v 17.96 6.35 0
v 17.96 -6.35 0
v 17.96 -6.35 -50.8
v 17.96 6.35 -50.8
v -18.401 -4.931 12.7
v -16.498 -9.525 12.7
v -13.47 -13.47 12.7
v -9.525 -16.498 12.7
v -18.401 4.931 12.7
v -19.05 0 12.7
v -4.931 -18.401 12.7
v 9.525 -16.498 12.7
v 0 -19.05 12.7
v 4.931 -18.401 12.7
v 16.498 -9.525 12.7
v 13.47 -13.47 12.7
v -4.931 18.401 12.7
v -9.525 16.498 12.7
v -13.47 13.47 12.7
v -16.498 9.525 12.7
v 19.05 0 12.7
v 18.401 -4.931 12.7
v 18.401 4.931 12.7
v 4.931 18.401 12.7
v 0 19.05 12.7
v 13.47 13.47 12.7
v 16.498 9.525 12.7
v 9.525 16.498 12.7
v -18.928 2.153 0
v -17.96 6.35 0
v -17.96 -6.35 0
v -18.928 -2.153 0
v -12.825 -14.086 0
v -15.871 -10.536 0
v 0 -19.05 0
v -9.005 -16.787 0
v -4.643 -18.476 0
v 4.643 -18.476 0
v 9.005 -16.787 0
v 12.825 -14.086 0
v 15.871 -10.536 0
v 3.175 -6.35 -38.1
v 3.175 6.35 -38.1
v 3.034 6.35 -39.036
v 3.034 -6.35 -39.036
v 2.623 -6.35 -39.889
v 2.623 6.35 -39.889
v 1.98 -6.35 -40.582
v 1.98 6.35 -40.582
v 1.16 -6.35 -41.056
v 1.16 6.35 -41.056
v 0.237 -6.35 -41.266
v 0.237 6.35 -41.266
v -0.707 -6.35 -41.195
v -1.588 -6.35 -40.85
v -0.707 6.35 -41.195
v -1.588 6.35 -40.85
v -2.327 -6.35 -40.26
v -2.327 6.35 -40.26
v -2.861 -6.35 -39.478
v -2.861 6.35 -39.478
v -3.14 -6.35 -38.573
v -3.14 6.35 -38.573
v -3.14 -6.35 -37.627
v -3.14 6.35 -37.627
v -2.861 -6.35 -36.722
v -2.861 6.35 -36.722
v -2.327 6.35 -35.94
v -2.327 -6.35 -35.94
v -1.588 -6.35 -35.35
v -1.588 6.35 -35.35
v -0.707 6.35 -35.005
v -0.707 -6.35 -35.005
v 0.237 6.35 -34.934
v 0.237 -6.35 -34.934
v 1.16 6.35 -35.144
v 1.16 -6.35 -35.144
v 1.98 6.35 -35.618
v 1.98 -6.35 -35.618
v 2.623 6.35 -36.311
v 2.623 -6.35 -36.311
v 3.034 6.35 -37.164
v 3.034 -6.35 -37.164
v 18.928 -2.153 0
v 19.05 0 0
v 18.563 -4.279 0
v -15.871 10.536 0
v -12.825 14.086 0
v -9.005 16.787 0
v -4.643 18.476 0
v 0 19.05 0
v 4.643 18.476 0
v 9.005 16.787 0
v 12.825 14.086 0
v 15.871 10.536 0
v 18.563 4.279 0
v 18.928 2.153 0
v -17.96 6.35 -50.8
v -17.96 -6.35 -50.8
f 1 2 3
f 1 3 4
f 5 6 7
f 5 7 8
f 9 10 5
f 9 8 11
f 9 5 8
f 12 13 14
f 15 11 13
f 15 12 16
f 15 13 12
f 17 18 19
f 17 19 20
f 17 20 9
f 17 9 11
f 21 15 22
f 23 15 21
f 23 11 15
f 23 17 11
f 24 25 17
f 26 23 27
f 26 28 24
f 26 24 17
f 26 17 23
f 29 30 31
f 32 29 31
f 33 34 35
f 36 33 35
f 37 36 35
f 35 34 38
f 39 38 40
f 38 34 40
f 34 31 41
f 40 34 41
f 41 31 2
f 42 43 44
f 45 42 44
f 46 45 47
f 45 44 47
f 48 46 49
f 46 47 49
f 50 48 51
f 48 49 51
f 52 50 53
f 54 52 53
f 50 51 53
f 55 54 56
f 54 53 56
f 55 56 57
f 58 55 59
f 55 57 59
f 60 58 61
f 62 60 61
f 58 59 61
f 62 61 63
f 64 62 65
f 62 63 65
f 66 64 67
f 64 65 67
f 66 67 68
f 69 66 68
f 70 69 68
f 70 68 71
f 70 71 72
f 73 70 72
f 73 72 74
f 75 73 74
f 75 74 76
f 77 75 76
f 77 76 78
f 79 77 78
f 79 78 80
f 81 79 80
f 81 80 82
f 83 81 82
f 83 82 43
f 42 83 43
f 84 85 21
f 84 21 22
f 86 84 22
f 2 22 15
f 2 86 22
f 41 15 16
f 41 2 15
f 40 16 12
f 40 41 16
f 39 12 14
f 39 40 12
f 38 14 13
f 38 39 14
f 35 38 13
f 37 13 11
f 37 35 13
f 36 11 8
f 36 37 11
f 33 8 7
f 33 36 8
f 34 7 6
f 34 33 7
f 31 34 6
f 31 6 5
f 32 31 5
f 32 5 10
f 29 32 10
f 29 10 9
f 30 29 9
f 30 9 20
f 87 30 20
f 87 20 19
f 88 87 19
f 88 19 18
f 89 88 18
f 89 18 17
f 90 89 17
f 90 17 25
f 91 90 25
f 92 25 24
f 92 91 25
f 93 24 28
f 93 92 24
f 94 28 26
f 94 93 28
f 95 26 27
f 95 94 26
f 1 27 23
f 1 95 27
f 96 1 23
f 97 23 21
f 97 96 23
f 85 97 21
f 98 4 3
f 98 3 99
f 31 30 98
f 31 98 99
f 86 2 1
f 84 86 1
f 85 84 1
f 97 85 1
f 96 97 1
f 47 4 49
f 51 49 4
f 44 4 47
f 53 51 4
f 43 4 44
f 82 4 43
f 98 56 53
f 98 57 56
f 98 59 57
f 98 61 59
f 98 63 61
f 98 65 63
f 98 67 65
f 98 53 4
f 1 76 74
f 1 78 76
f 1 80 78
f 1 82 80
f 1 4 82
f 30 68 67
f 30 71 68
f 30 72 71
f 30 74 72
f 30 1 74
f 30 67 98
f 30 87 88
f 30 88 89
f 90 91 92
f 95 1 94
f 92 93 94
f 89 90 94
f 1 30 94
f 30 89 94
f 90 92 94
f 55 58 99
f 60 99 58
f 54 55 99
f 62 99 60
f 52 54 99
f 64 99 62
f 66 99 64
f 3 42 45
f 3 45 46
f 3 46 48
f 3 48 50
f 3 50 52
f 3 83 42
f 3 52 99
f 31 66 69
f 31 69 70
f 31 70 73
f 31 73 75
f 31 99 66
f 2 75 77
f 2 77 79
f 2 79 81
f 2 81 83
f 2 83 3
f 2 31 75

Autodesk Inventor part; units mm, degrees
ref_plane "YZ Plane" through (0, 0, 0) normal (1, 0, 0) x (0, 1, 0)
ref_plane "XZ Plane" through (0, 0, 0) normal (0, 1, 0) x (-1, 0, 0)
ref_plane "XY Plane" through (0, 0, 0) normal (0, 0, 1) x (1, 0, 0)
sketch "Sketch1" plane through (0, 0, 0) normal (0, 0, 1) x (1, 0, 0)
  circle A0 centre (0, 0) radius 19.05
  dimension "d0" = 38.1
extrude "Extrusion1" add sketch "Sketch1" along normal blind 12.7
sketch "Sketch2" plane through (0, 0, 0) normal (0, 0, -1) x (-1, 0, 0)
  circle A0 centre (0, 0) radius 19.05 projected
  line L0 (-17.9605, 6.35) -> (17.9605, 6.35)
  line L1 (17.9605, 6.35) -> (17.9605, -6.35)
  line L2 (17.9605, -6.35) -> (-17.9605, -6.35)
  line L3 (-17.9605, -6.35) -> (-17.9605, 6.35)
  dimension "d3" = 12.7
  dimension "d4" = 12.7
extrude "Extrusion2" add sketch "Sketch2" along normal blind 50.8 contours L1 L2 L3 L0
sketch "Sketch3" plane through (-17.9605, 6.35, 0) normal (0, 1, 0) x (1, 0, 0)
  circle A0 centre (17.9605, 38.1) radius 3.175
  line L0 (35.921, 0) -> (35.921, 50.8) projected
  line L1 (0, 50.8) -> (35.921, 50.8) projected
  point P0 (17.9605, 0)
  dimension "d7" = 6.35
  dimension "d8" = 17.9605
  dimension "d9" = 12.7
extrude "Extrusion3" cut sketch "Sketch3" against normal blind 25.4
properties part number "Bottom Pneumatics notch"
